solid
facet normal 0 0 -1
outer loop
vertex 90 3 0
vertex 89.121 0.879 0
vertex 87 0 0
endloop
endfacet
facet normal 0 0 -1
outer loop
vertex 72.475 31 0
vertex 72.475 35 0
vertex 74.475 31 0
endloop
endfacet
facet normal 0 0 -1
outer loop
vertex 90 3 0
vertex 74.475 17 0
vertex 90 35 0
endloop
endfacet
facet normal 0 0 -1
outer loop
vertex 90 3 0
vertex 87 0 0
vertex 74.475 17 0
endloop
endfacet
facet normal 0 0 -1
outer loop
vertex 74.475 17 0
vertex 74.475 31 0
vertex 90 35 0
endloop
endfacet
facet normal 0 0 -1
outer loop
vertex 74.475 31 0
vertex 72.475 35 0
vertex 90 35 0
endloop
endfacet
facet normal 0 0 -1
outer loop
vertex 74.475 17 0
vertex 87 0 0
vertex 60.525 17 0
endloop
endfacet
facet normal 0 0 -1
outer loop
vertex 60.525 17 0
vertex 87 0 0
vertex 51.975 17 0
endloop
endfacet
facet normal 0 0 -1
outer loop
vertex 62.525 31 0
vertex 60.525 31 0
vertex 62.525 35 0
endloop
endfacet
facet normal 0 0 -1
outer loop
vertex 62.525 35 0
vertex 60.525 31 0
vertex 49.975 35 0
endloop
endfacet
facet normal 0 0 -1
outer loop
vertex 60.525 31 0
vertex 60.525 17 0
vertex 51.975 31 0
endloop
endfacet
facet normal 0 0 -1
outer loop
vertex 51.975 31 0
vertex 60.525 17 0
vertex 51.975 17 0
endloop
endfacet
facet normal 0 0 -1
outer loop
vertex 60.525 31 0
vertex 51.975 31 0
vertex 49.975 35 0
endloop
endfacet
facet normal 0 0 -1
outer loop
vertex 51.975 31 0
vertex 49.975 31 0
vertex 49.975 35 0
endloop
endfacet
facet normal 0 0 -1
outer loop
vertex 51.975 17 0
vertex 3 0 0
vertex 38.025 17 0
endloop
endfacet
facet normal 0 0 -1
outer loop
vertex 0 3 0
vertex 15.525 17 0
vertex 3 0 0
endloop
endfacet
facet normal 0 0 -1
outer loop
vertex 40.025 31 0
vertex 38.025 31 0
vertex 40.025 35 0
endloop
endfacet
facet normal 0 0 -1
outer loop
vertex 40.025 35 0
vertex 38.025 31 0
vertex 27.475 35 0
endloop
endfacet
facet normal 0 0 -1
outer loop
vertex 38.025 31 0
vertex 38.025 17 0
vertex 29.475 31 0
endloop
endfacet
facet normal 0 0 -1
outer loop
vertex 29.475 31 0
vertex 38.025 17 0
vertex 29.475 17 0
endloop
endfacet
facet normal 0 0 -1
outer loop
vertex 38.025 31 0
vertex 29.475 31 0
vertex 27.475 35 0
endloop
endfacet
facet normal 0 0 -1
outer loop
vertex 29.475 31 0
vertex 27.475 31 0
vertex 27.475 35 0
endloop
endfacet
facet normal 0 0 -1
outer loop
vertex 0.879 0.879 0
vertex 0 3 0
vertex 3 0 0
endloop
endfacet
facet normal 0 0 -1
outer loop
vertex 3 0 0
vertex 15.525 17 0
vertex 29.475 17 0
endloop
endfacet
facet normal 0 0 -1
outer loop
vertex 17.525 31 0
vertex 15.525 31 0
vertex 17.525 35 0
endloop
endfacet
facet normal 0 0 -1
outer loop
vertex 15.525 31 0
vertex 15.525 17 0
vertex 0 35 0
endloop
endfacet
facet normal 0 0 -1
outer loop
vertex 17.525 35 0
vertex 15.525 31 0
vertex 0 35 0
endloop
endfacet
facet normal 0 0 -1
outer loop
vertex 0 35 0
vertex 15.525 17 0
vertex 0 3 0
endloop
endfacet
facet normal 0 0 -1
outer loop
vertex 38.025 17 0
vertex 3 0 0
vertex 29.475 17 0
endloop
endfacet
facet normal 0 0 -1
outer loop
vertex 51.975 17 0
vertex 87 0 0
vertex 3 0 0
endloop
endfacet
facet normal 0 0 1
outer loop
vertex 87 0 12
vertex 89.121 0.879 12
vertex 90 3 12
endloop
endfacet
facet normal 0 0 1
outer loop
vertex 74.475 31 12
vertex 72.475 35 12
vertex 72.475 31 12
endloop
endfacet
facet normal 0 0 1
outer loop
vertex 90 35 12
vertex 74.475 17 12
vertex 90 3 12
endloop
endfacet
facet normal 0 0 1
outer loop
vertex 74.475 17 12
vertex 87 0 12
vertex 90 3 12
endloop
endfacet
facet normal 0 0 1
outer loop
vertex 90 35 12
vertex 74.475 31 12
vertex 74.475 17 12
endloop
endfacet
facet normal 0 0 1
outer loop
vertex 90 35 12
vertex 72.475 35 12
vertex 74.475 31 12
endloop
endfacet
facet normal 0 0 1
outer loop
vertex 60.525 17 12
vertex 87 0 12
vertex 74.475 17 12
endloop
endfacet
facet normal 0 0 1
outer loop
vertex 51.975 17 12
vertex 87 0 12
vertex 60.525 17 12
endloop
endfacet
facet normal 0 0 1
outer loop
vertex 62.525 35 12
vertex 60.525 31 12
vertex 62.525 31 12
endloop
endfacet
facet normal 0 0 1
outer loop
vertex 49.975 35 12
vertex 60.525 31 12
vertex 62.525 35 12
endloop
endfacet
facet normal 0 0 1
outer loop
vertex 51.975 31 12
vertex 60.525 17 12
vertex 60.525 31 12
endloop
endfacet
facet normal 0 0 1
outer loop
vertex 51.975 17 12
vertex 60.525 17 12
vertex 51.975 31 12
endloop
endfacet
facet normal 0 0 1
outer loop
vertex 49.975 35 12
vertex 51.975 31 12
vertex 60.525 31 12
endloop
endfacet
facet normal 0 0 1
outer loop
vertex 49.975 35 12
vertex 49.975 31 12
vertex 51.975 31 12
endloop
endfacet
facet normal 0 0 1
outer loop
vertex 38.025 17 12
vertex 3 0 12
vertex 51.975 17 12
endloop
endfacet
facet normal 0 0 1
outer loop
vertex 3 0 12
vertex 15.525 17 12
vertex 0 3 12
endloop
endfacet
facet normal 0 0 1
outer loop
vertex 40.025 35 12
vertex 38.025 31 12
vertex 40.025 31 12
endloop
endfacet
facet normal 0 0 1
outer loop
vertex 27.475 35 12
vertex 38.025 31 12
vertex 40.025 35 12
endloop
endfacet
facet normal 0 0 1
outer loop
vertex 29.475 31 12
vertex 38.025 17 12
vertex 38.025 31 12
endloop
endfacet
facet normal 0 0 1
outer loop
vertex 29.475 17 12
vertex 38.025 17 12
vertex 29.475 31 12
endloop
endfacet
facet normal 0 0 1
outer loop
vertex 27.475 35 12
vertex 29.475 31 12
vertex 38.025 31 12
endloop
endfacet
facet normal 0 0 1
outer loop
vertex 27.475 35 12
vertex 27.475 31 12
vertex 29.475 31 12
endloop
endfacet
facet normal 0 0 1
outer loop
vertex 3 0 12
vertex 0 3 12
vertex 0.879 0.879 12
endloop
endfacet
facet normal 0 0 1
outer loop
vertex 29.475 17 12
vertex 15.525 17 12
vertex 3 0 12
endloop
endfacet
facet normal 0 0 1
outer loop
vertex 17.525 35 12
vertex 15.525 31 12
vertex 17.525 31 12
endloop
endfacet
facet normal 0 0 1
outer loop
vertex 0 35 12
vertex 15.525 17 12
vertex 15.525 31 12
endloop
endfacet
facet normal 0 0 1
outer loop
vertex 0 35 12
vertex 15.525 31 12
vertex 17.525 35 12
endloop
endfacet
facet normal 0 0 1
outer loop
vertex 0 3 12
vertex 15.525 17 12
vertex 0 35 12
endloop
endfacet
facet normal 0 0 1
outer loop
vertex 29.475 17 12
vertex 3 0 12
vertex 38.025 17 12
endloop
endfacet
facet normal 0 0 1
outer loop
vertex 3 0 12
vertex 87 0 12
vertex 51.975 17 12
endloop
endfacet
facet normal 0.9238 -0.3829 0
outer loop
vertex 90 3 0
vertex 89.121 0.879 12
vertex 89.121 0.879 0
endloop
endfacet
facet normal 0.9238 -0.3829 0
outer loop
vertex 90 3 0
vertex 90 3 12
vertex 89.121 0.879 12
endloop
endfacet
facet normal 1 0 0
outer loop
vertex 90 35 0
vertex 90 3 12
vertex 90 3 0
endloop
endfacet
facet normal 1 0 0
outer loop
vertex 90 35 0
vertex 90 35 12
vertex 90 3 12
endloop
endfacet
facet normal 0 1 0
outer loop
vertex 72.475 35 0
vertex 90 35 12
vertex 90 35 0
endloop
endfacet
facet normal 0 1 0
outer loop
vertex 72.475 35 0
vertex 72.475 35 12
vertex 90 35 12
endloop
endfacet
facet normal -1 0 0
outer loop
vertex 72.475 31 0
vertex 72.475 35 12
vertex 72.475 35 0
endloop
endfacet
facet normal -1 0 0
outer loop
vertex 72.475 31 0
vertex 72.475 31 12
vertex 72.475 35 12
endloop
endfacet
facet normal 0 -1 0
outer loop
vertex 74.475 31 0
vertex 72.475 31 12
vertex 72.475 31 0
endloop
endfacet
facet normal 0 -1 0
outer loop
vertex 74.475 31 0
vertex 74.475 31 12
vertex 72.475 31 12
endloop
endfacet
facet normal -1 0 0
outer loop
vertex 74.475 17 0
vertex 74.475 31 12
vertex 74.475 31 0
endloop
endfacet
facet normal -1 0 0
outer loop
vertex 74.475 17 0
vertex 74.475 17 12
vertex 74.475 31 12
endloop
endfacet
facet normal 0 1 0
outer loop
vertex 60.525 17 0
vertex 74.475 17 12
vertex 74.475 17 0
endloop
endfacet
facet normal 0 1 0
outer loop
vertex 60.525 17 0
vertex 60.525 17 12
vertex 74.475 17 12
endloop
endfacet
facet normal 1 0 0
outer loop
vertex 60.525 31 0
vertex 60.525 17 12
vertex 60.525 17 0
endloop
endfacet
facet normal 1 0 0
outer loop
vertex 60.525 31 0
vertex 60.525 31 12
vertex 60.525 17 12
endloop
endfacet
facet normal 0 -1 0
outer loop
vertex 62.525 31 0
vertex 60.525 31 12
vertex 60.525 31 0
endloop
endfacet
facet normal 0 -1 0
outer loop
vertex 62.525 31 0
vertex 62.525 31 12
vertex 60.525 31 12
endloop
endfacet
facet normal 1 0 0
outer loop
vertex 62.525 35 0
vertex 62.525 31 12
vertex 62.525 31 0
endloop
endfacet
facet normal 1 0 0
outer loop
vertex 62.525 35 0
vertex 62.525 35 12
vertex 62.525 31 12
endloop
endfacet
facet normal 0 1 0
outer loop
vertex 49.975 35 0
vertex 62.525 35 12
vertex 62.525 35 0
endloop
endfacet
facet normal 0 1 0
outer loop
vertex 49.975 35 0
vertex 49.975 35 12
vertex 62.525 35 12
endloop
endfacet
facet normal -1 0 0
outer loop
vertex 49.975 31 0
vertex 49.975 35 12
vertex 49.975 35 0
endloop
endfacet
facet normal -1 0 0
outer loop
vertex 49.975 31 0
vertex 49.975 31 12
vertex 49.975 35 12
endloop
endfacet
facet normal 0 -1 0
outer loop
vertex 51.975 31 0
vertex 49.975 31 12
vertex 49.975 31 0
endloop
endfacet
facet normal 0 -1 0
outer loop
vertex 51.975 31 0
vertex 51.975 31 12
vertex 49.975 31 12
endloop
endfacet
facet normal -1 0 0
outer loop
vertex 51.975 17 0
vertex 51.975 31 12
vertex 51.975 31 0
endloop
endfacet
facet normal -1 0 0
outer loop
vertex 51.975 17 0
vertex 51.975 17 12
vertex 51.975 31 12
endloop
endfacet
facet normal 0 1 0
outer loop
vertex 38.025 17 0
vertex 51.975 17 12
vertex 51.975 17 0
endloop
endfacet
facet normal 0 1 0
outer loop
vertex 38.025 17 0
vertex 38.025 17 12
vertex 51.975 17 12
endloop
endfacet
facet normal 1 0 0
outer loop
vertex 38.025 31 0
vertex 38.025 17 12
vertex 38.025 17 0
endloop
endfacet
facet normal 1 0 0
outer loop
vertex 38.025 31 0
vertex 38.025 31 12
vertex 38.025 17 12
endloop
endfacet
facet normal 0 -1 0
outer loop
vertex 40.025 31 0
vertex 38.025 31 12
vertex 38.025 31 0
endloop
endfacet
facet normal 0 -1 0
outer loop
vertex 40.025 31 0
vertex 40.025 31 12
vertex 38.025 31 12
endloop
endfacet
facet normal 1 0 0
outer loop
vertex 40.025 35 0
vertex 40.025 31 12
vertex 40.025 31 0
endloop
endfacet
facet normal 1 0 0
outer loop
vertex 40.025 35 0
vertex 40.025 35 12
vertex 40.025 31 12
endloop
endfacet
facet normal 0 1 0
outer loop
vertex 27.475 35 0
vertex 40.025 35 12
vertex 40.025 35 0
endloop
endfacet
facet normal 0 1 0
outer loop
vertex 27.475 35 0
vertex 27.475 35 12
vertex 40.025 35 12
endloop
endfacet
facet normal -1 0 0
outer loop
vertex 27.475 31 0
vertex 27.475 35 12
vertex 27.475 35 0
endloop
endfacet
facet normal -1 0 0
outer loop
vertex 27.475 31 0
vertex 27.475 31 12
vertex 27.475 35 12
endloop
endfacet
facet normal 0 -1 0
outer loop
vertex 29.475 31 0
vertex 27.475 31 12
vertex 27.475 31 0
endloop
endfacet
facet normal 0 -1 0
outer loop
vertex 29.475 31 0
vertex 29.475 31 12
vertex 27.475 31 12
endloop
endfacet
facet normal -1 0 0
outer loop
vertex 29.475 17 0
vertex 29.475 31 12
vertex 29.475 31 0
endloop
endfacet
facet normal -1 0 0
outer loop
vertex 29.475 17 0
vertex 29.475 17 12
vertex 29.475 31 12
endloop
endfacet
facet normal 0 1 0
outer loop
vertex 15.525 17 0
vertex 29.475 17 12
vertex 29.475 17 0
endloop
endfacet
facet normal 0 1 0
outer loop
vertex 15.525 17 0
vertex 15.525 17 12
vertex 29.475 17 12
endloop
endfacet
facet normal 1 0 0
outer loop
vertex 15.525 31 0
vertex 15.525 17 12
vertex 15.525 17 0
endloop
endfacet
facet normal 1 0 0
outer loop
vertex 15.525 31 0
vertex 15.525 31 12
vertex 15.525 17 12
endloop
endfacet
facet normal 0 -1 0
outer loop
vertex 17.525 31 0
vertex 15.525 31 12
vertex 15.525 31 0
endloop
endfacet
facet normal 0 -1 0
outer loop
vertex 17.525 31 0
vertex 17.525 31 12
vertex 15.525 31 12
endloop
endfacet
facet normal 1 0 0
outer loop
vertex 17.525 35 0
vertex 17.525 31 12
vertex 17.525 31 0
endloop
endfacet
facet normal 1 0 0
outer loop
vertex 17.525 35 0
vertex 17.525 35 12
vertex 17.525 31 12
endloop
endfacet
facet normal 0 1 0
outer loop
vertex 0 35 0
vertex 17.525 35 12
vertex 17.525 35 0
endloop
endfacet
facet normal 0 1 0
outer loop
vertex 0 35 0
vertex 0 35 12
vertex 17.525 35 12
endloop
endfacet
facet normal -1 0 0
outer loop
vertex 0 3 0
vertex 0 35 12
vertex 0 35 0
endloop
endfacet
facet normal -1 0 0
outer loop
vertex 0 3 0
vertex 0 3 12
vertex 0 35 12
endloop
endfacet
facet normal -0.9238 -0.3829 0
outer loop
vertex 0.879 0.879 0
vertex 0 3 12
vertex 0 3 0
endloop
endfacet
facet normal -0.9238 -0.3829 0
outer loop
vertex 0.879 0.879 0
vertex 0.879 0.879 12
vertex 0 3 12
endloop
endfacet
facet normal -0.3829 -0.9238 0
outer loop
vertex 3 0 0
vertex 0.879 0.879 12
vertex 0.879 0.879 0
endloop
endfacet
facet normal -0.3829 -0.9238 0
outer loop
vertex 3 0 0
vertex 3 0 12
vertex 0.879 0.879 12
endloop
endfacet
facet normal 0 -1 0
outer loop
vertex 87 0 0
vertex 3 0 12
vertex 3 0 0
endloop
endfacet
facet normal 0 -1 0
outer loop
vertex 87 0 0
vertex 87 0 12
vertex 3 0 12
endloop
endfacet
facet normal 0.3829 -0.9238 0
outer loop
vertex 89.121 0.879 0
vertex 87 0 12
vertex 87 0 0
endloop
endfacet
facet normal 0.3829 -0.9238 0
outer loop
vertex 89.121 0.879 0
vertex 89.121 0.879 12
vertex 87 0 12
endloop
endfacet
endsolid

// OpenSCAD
$fn = 32;

// ----------------------------------------------------------------------
// Window plate: 90 x 35 mm, 3 open windows
// ----------------------------------------------------------------------

// --- parameters (mm) ---
profile_height = 12;      // extrusion height
profile_points = 32;      // points of the closed outline

profile = [[0, 3], [0.879, 0.879], [3, 0], [87, 0], [89.121, 0.879], [90, 3], [90, 35], [72.475, 35], [72.475, 31], [74.475, 31], [74.475, 17], [60.525, 17], [60.525, 31], [62.525, 31], [62.525, 35], [49.975, 35], [49.975, 31], [51.975, 31], [51.975, 17], [38.025, 17], [38.025, 31], [40.025, 31], [40.025, 35], [27.475, 35], [27.475, 31], [29.475, 31], [29.475, 17], [15.525, 17], [15.525, 31], [17.525, 31], [17.525, 35], [0, 35]];  // single closed polygon, 32 points, counter clockwise

// --- the one profile operation ---
linear_extrude(height = profile_height) polygon(points = profile);
